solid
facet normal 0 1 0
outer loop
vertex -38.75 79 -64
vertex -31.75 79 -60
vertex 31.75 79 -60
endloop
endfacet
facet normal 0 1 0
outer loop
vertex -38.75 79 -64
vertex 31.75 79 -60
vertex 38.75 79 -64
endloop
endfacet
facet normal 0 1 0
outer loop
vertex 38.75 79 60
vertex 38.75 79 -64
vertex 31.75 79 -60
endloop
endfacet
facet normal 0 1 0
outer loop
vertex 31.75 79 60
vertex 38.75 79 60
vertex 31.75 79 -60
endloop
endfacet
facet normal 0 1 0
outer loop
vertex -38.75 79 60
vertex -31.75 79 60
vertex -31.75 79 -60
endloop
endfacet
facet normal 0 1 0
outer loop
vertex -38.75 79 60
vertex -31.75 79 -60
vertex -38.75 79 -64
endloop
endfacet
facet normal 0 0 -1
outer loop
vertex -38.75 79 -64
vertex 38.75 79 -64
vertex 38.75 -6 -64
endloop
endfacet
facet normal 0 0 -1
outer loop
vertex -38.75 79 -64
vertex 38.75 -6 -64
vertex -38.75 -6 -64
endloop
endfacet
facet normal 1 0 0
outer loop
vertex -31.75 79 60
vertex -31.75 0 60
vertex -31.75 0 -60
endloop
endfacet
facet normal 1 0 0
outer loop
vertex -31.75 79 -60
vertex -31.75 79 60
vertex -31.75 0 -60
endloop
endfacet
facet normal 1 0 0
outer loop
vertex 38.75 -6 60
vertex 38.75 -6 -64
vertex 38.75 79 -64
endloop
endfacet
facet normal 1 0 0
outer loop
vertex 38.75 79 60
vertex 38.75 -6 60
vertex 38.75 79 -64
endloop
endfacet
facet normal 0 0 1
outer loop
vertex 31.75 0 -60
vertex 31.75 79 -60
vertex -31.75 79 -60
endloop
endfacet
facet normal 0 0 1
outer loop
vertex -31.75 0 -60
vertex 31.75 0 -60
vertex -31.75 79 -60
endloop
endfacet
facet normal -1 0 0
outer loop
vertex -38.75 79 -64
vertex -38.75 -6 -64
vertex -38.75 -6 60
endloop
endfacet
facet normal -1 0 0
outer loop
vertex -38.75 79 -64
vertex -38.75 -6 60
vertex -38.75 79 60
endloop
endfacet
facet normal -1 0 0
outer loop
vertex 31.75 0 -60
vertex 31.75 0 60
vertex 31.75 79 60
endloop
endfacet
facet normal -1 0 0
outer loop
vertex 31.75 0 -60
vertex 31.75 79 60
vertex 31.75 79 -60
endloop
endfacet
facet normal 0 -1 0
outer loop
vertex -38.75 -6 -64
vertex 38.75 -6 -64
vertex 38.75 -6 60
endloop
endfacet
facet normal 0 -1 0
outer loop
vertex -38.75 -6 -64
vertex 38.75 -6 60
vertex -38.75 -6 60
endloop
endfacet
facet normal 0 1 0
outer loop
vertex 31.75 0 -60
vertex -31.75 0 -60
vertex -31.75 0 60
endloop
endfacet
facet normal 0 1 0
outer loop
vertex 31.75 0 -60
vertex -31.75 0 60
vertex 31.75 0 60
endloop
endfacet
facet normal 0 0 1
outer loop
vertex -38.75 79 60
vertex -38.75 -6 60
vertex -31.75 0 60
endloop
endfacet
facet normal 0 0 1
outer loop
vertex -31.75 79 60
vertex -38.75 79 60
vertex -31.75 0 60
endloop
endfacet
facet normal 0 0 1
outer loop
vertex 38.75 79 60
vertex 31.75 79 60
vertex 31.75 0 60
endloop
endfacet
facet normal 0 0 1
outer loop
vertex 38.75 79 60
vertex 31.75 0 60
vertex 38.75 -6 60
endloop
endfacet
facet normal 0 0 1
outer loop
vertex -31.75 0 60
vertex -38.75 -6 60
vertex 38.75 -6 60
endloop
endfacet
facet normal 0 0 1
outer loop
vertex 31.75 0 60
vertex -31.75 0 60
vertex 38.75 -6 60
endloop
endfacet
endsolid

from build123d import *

# Parameters (mm, degrees)
BRKT_1_5_6_BOSS_EXTRUDE1_START       = -6
BRKT_1_5_6_BOSS_EXTRUDE1_OUTLINE_W   = 7
BRKT_1_5_6_BOSS_EXTRUDE1_OUTLINE_H   = 120
BRKT_1_5_6_BOSS_EXTRUDE1_DEPTH       = 85
BRKT_1_5_6_BOSS_EXTRUDE1_2_OUTLINE_W = 63.5
BRKT_1_5_6_BOSS_EXTRUDE1_2_OUTLINE_H = 120
BRKT_1_5_6_BOSS_EXTRUDE1_2_DEPTH     = 6
SKETCH1_W                            = 77.5
SKETCH1_H                            = 85
BOSS_EXTRUDE1_DEPTH                  = 4


# Read off the part's stored shape, not the designer's step: <BRKT_1_5_6>-<Boss-Extrude1>
with BuildPart() as part:
    # <BRKT_1_5_6>-<Boss-Extrude1> outline → <BRKT_1_5_6>-<Boss-Extrude1> (new body)
    with BuildSketch(Plane(origin=(0, 0, 0), x_dir=(1, 0, 0), z_dir=(0, 1, 0)).offset(BRKT_1_5_6_BOSS_EXTRUDE1_START)):
        with Locations((35.25, 0)):
            Rectangle(BRKT_1_5_6_BOSS_EXTRUDE1_OUTLINE_W, BRKT_1_5_6_BOSS_EXTRUDE1_OUTLINE_H)
        with Locations((-35.25, 0)):
            Rectangle(BRKT_1_5_6_BOSS_EXTRUDE1_OUTLINE_W, BRKT_1_5_6_BOSS_EXTRUDE1_OUTLINE_H)
    extrude(amount=BRKT_1_5_6_BOSS_EXTRUDE1_DEPTH)

    # BRKT_1_5_6_-_Boss-Extrude1 2 outline → BRKT_1_5_6_-_Boss-Extrude1 2 (add)
    with BuildSketch(Plane(origin=(0, 0, 0), x_dir=(1, 0, 0), z_dir=(0, 1, 0)).offset(BRKT_1_5_6_BOSS_EXTRUDE1_START)):
        Rectangle(BRKT_1_5_6_BOSS_EXTRUDE1_2_OUTLINE_W, BRKT_1_5_6_BOSS_EXTRUDE1_2_OUTLINE_H)
    extrude(amount=BRKT_1_5_6_BOSS_EXTRUDE1_2_DEPTH)

    # Sketch1 → Boss-Extrude1 (add)
    with BuildSketch(Plane(origin=(0, 0, -60), x_dir=(-1, 0, 0), z_dir=(0, 0, -1))):
        with Locations((0, 36.5)):
            Rectangle(SKETCH1_W, SKETCH1_H)
    extrude(amount=BOSS_EXTRUDE1_DEPTH)


solid = part.part
